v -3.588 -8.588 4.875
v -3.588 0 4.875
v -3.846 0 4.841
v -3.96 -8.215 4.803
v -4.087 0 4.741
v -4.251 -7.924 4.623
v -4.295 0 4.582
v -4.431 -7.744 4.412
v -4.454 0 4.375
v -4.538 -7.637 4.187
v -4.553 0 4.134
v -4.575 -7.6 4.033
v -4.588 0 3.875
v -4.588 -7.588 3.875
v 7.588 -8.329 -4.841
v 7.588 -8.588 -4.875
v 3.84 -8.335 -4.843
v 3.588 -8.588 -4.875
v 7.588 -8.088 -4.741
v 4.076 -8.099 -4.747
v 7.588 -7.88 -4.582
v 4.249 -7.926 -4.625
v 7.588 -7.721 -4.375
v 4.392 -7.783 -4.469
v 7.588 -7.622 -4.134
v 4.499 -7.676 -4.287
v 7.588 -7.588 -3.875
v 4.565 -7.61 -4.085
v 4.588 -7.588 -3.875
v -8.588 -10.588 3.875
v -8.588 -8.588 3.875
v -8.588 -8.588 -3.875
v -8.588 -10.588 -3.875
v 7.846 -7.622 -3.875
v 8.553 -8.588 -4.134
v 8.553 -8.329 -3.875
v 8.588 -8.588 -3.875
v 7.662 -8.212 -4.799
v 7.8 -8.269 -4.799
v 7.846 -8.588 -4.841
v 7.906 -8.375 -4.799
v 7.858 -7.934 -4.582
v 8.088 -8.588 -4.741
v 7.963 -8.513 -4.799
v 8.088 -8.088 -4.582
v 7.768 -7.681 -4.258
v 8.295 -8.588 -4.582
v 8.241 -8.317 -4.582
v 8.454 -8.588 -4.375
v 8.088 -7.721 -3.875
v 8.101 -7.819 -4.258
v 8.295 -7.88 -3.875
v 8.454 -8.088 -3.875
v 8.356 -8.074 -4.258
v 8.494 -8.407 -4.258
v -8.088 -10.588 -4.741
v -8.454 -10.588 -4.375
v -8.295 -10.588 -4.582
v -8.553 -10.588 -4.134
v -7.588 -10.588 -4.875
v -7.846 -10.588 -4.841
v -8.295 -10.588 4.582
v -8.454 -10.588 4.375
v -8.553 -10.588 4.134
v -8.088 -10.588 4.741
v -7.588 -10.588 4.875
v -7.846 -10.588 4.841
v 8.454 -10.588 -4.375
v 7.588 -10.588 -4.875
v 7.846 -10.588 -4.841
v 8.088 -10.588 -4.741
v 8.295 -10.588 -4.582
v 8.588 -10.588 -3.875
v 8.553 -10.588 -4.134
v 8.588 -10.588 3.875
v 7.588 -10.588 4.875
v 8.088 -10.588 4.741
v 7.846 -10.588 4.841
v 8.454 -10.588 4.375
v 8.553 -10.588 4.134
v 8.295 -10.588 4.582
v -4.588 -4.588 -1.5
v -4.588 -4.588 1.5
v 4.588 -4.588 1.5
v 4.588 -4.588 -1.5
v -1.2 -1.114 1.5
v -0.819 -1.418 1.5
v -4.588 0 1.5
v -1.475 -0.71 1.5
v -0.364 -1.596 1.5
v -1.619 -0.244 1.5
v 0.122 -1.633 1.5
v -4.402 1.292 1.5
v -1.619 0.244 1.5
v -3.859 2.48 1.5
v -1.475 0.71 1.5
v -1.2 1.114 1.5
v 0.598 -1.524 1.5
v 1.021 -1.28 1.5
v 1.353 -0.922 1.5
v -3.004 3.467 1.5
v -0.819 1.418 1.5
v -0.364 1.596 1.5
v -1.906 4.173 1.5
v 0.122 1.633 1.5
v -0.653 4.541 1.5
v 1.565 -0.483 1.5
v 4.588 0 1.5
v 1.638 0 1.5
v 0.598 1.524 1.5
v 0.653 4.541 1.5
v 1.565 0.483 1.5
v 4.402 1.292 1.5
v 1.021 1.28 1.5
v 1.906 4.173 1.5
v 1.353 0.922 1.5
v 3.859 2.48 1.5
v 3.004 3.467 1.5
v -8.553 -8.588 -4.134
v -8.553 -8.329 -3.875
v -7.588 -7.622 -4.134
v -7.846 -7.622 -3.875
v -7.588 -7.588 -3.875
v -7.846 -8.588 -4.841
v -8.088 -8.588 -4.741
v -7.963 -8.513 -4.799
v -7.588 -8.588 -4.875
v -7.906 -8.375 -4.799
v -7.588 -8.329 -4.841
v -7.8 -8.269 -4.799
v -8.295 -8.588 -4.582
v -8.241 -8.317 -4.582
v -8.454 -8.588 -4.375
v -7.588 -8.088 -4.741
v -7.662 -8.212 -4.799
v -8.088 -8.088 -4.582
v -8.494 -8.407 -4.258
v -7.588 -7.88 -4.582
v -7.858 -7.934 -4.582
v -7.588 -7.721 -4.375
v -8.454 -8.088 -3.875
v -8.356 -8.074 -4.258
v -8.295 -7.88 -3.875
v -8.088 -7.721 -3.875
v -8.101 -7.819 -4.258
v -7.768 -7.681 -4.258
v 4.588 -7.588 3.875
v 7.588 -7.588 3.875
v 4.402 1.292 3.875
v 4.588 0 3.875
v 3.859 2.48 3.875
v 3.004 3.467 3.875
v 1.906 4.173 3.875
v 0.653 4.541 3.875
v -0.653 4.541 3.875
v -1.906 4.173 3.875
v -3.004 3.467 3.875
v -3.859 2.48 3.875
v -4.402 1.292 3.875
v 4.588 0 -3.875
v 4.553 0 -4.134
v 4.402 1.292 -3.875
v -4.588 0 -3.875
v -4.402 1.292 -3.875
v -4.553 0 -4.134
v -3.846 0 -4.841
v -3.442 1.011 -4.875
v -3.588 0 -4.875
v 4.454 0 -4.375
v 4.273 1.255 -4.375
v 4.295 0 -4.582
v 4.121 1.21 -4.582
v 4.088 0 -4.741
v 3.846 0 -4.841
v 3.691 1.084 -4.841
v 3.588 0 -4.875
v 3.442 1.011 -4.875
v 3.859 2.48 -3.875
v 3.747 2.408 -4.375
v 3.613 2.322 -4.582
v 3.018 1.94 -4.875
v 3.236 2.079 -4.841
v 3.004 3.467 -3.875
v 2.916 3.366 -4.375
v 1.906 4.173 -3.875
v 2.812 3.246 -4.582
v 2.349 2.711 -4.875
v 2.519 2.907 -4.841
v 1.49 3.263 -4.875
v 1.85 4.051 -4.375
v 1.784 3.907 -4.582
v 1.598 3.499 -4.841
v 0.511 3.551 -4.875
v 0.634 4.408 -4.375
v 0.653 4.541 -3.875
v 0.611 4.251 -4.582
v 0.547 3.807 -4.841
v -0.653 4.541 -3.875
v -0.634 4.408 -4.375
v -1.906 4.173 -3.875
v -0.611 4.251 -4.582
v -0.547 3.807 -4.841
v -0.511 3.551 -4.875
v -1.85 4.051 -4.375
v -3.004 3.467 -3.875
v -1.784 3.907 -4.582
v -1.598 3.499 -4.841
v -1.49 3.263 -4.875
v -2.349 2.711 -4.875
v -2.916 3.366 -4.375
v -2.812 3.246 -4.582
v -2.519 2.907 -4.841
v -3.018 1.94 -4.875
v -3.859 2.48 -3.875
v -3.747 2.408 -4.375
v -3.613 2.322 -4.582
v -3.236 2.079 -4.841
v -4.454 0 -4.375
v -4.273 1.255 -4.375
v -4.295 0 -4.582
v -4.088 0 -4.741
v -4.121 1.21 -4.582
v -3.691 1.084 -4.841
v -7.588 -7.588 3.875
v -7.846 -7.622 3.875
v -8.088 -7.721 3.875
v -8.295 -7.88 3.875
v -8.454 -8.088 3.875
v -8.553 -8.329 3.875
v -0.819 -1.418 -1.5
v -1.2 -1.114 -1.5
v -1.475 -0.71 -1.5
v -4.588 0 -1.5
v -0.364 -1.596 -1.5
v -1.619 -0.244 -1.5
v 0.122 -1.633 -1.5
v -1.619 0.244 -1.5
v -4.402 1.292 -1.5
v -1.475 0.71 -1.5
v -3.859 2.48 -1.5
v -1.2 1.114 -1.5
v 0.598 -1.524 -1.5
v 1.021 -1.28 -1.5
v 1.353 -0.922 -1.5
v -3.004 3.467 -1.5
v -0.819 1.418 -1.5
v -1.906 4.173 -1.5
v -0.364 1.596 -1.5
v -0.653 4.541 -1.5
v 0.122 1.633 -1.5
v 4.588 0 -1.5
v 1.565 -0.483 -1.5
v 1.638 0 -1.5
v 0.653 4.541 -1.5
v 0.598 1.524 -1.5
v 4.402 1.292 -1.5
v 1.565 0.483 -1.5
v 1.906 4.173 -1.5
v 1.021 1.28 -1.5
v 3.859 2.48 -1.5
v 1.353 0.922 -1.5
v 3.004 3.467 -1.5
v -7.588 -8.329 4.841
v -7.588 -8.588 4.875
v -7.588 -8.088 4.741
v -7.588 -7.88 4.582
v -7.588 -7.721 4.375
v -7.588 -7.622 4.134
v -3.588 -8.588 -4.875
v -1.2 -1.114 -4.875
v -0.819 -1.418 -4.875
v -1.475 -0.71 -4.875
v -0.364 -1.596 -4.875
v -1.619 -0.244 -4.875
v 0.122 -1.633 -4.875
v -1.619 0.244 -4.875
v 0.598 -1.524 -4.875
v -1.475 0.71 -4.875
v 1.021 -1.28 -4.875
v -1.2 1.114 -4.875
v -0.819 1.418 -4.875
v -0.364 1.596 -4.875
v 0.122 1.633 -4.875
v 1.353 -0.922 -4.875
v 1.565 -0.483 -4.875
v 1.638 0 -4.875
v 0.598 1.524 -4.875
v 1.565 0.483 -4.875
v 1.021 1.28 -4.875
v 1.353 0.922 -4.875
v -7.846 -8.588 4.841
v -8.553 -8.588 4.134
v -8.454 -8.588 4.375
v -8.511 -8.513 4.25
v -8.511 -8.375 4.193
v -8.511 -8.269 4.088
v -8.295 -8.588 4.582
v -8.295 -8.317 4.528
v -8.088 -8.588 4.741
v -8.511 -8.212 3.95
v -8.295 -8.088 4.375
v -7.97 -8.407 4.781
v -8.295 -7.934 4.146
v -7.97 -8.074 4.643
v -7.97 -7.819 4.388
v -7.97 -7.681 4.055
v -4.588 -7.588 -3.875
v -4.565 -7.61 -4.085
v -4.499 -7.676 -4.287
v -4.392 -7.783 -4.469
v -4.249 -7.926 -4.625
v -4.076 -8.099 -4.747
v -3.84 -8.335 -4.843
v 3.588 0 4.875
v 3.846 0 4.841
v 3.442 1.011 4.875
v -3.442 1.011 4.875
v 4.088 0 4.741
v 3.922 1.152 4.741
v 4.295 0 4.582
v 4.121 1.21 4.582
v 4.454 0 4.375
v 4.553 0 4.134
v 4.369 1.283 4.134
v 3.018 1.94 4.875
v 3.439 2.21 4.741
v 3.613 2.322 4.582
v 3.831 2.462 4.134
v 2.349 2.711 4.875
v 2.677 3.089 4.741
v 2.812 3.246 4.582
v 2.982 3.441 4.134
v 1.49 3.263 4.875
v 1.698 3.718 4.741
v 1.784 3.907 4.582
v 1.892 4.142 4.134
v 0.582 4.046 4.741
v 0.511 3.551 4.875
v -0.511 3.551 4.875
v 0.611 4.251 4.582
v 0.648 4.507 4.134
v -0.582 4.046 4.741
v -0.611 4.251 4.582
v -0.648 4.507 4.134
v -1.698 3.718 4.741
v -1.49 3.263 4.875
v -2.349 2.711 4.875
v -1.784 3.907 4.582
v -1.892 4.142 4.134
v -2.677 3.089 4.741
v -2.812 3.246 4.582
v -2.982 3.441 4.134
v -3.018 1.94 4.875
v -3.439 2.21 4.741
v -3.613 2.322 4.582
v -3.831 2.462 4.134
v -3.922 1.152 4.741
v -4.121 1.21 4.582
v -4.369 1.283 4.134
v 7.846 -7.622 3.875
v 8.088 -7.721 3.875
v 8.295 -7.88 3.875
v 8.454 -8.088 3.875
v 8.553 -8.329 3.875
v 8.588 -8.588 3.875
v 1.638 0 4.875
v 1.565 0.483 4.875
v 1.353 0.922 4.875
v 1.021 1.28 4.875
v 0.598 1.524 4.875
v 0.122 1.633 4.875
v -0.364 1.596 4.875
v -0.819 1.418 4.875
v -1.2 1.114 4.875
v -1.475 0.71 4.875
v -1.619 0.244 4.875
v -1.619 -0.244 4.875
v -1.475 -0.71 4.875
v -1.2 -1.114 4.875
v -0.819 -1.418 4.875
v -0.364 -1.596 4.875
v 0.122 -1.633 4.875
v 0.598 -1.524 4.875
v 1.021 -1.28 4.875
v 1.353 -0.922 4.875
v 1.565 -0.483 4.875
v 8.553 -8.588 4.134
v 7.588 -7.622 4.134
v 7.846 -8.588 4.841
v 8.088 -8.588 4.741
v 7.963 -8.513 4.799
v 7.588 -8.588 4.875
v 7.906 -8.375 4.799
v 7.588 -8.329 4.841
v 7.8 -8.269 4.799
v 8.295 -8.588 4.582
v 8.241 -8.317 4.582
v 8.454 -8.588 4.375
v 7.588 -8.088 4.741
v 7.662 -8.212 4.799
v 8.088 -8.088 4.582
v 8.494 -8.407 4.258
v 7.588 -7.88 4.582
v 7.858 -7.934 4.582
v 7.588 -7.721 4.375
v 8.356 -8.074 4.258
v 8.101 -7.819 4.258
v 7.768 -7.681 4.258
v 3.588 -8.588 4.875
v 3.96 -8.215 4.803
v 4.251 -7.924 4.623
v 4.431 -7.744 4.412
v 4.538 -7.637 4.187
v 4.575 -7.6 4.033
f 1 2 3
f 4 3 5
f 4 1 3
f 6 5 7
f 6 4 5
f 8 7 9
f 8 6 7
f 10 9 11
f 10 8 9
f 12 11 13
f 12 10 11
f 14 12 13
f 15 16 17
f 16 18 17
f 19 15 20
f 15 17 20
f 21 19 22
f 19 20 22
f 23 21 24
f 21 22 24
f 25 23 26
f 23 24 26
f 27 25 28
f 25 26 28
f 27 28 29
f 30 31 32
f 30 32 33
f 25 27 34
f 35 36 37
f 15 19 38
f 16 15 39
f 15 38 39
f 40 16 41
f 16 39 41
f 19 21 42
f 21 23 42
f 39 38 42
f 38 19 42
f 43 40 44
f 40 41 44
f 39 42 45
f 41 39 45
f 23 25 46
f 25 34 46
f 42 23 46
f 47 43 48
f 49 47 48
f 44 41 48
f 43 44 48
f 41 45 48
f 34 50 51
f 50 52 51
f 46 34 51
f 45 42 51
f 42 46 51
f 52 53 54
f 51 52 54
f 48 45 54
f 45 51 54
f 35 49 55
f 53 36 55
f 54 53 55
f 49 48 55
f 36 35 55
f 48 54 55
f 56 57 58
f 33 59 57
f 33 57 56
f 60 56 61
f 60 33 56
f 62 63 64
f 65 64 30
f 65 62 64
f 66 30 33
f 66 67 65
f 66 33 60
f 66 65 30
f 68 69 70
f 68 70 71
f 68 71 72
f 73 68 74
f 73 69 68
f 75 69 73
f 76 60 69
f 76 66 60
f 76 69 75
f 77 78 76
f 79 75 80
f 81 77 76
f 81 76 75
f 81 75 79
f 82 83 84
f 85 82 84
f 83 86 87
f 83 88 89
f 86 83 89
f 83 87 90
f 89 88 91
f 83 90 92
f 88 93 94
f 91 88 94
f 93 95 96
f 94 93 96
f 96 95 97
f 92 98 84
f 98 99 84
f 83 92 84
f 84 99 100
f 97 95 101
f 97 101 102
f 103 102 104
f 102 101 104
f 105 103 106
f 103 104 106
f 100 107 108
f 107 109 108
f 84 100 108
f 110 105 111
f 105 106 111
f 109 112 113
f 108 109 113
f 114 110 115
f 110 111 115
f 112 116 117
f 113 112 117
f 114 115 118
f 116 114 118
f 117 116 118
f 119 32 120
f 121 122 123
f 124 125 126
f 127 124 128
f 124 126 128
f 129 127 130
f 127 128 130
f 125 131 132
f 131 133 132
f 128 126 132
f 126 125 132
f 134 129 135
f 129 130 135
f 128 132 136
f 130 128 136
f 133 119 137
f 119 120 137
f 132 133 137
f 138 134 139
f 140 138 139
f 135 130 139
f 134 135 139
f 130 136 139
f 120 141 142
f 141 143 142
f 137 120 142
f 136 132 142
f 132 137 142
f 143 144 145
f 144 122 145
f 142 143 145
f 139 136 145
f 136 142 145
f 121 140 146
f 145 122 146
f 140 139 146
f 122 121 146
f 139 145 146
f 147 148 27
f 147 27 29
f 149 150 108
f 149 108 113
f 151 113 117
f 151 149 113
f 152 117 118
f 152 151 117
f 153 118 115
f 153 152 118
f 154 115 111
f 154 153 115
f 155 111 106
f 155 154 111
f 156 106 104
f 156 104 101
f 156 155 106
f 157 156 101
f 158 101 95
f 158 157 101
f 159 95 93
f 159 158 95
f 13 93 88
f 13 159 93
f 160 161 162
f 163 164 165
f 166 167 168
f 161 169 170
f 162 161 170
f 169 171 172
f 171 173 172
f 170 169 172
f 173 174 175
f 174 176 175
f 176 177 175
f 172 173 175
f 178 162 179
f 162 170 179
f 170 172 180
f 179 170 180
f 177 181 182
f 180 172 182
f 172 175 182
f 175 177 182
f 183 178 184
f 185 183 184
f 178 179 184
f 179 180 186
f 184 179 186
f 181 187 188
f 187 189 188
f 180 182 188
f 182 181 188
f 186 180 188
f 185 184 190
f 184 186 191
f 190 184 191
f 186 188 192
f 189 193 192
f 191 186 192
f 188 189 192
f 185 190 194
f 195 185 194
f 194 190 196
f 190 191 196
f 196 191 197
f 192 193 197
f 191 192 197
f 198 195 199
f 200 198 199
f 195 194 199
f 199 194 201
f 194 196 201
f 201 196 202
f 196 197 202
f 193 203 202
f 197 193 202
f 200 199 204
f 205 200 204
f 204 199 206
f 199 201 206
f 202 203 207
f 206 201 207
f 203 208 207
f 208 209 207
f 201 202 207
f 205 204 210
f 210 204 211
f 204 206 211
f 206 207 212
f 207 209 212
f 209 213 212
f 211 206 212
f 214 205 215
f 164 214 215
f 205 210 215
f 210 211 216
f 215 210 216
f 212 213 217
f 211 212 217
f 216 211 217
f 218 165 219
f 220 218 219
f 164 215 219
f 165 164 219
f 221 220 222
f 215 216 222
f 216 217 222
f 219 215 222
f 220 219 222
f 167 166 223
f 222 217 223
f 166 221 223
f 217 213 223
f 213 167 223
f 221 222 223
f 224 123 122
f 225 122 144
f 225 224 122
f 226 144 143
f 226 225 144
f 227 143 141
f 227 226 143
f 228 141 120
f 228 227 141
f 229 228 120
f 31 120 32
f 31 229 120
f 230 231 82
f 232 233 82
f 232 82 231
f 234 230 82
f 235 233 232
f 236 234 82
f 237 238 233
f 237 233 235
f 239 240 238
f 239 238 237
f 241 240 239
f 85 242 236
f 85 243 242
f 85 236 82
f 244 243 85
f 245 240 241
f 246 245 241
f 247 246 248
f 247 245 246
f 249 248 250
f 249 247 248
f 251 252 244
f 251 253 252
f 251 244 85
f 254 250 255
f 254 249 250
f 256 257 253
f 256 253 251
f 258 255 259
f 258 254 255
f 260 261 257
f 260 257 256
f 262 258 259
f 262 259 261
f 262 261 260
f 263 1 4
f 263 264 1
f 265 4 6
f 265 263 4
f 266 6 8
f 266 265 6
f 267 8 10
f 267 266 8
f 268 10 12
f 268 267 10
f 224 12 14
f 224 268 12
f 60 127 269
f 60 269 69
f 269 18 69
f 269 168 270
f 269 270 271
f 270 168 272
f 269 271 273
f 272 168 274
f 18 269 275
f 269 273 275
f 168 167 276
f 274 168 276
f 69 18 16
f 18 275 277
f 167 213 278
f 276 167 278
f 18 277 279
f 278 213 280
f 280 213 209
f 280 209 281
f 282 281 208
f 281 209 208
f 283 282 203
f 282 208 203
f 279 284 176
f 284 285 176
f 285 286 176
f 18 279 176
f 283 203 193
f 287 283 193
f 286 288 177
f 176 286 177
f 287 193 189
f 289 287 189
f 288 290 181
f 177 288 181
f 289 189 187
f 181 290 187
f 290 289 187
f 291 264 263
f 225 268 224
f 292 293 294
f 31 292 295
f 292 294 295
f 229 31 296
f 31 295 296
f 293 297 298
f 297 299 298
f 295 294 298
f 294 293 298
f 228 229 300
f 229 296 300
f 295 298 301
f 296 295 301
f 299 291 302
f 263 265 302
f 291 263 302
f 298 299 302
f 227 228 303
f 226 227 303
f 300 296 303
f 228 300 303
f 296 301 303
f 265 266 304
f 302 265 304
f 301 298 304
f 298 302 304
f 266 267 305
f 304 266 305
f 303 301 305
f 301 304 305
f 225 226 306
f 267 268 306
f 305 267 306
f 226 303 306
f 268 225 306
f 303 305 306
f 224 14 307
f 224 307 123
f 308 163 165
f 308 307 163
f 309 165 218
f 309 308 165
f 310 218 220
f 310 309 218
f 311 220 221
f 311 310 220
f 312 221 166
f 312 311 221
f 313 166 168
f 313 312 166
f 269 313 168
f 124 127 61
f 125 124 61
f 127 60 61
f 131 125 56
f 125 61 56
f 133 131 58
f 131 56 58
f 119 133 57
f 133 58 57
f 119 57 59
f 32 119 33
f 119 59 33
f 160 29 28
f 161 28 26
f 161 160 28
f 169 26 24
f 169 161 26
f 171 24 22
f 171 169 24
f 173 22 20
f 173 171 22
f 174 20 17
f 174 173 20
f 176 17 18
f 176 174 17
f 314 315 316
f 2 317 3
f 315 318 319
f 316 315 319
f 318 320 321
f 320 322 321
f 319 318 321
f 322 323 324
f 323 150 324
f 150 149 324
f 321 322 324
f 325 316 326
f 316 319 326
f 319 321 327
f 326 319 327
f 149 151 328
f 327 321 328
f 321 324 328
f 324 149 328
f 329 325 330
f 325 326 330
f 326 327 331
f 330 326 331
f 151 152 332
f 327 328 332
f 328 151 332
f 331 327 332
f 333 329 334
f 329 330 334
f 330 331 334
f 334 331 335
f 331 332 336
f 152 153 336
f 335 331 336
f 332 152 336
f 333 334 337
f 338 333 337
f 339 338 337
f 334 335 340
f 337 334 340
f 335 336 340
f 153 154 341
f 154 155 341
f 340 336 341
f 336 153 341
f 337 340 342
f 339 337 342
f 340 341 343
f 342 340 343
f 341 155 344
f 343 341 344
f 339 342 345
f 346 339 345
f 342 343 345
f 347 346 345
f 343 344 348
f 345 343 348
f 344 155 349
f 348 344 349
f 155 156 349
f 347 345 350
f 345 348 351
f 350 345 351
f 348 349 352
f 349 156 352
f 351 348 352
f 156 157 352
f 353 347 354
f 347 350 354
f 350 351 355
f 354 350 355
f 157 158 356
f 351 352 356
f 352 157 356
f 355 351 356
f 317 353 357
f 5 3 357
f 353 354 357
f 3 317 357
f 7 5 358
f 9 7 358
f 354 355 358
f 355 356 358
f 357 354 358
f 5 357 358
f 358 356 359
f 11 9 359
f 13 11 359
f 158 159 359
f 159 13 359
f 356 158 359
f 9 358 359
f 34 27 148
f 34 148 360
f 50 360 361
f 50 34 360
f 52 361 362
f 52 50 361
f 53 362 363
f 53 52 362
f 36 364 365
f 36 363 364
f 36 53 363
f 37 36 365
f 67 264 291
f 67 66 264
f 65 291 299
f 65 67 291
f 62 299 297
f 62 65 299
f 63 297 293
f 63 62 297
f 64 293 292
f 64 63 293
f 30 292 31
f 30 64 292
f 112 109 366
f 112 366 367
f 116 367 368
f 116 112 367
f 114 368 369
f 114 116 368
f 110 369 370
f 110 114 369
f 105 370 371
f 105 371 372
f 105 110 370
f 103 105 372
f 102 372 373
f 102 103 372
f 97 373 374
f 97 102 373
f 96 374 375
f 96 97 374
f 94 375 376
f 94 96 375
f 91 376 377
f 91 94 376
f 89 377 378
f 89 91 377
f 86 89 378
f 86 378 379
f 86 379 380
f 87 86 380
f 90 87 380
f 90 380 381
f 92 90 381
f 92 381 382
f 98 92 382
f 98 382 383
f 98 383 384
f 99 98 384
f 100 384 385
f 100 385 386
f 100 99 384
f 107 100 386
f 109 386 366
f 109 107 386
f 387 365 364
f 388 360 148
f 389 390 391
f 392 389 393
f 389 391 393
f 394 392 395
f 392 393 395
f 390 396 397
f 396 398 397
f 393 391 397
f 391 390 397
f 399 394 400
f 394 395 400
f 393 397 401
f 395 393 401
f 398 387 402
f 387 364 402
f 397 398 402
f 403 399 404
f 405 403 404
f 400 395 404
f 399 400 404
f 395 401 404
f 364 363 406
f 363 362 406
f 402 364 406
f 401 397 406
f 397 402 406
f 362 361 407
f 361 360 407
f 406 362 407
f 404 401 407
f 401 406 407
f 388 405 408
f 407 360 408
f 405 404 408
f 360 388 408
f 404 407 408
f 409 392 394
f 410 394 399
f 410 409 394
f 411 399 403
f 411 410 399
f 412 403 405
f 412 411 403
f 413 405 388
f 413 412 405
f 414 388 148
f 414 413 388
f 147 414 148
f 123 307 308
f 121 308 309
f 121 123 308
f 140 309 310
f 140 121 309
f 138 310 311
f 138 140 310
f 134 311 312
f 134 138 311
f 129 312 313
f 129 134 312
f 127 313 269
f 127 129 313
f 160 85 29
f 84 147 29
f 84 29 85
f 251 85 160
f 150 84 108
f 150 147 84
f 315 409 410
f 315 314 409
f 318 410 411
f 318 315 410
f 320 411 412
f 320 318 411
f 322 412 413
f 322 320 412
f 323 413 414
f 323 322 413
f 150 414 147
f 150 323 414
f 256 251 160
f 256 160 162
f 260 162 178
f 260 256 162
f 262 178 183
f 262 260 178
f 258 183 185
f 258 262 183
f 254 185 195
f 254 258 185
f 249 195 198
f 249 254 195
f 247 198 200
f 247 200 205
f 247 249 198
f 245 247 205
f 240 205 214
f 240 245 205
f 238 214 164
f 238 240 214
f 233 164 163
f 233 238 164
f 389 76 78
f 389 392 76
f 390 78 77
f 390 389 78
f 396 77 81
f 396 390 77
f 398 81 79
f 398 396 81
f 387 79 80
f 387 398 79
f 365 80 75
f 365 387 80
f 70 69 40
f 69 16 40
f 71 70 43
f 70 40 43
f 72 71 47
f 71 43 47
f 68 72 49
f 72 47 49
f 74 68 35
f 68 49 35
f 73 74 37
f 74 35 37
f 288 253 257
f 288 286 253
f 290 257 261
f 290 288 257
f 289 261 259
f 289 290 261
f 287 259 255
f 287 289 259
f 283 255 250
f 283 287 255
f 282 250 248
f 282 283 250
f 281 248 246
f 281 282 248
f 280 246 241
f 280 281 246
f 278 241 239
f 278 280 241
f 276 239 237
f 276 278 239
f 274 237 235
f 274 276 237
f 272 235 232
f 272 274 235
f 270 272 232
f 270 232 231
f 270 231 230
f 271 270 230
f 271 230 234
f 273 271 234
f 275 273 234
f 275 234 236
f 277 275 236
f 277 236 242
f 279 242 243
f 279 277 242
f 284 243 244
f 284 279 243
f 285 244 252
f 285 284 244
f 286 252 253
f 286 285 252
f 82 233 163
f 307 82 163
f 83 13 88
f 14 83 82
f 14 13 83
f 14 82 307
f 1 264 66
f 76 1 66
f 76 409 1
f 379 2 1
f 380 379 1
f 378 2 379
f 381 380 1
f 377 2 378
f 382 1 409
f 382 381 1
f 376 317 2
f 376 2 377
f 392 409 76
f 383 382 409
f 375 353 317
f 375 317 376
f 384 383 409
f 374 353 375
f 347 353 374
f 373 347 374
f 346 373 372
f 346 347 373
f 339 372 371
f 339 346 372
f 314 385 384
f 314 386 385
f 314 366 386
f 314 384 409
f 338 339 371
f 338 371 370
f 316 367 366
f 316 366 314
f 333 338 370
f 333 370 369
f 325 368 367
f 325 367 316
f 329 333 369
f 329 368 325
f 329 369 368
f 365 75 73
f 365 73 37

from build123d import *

# Parameters (mm, degrees)
SKETCH1_R           = 1.6375
BOSS_EXTRUDE1_DEPTH = 4.875
SKETCH3_R           = 1.6375
CUT_EXTRUDE1_DEPTH  = 1.5
FILLET1_R           = 1


with BuildPart() as part:
    # Sketch1 → Boss-Extrude1 (new body, symmetric)
    with BuildSketch(Plane.XY):
        with BuildLine():
            Line((-4.5875, 0), (-4.5875, -7.5875))
            Line((-4.5875, -7.5875), (-8.5875, -7.5875))
            Line((-8.5875, -7.5875), (-8.5875, -10.5875))
            Line((-8.5875, -10.5875), (8.5875, -10.5875))
            Line((8.5875, -10.5875), (8.5875, -7.5875))
            Line((8.5875, -7.5875), (4.5875, -7.5875))
            Line((4.5875, -7.5875), (4.5875, 0))
            ThreePointArc((4.5875, 0), (0, 4.5875), (-4.5875, 0))
        make_face()
        Circle(SKETCH1_R, mode=Mode.SUBTRACT)
    extrude(amount=BOSS_EXTRUDE1_DEPTH, both=True)

    # Sketch3 → Cut-Extrude1 (cut, symmetric)
    with BuildSketch(Plane.XY):
        with BuildLine():
            Line((-4.5875, 0), (-4.5875, -4.5875))
            Line((-4.5875, -4.5875), (4.5875, -4.5875))
            Line((4.5875, -4.5875), (4.5875, 0))
            ThreePointArc((4.5875, 0), (0, 4.5875), (-4.5875, 0))
        make_face()
        Circle(SKETCH3_R, mode=Mode.SUBTRACT)
    extrude(amount=CUT_EXTRUDE1_DEPTH, both=True, mode=Mode.SUBTRACT)

    # Fillet1
    fillet1_edges = [part.edges().sort_by_distance(p)[0] for p in [
        (-6.5875, -7.5875, 4.875),
        (-4.5875, -3.79375, -4.875),
        (0, 4.5875, -4.875),
        (-8.5875, -9.0875, 4.875),
        (8.5875, -7.5875, 0),
        (-8.5875, -7.5875, 0),
        (8.5875, -9.0875, 4.875),
        (6.5875, -7.5875, 4.875),
        (4.5875, -3.79375, 4.875),
        (0, 4.5875, 4.875),
        (-4.5875, -3.79375, 4.875),
        (4.5875, -3.79375, -4.875),
        (6.5875, -7.5875, -4.875),
        (8.5875, -9.0875, -4.875),
        (-8.5875, -9.0875, -4.875),
        (-6.5875, -7.5875, -4.875),
    ]]
    fillet(fillet1_edges, radius=FILLET1_R)


solid = part.part
